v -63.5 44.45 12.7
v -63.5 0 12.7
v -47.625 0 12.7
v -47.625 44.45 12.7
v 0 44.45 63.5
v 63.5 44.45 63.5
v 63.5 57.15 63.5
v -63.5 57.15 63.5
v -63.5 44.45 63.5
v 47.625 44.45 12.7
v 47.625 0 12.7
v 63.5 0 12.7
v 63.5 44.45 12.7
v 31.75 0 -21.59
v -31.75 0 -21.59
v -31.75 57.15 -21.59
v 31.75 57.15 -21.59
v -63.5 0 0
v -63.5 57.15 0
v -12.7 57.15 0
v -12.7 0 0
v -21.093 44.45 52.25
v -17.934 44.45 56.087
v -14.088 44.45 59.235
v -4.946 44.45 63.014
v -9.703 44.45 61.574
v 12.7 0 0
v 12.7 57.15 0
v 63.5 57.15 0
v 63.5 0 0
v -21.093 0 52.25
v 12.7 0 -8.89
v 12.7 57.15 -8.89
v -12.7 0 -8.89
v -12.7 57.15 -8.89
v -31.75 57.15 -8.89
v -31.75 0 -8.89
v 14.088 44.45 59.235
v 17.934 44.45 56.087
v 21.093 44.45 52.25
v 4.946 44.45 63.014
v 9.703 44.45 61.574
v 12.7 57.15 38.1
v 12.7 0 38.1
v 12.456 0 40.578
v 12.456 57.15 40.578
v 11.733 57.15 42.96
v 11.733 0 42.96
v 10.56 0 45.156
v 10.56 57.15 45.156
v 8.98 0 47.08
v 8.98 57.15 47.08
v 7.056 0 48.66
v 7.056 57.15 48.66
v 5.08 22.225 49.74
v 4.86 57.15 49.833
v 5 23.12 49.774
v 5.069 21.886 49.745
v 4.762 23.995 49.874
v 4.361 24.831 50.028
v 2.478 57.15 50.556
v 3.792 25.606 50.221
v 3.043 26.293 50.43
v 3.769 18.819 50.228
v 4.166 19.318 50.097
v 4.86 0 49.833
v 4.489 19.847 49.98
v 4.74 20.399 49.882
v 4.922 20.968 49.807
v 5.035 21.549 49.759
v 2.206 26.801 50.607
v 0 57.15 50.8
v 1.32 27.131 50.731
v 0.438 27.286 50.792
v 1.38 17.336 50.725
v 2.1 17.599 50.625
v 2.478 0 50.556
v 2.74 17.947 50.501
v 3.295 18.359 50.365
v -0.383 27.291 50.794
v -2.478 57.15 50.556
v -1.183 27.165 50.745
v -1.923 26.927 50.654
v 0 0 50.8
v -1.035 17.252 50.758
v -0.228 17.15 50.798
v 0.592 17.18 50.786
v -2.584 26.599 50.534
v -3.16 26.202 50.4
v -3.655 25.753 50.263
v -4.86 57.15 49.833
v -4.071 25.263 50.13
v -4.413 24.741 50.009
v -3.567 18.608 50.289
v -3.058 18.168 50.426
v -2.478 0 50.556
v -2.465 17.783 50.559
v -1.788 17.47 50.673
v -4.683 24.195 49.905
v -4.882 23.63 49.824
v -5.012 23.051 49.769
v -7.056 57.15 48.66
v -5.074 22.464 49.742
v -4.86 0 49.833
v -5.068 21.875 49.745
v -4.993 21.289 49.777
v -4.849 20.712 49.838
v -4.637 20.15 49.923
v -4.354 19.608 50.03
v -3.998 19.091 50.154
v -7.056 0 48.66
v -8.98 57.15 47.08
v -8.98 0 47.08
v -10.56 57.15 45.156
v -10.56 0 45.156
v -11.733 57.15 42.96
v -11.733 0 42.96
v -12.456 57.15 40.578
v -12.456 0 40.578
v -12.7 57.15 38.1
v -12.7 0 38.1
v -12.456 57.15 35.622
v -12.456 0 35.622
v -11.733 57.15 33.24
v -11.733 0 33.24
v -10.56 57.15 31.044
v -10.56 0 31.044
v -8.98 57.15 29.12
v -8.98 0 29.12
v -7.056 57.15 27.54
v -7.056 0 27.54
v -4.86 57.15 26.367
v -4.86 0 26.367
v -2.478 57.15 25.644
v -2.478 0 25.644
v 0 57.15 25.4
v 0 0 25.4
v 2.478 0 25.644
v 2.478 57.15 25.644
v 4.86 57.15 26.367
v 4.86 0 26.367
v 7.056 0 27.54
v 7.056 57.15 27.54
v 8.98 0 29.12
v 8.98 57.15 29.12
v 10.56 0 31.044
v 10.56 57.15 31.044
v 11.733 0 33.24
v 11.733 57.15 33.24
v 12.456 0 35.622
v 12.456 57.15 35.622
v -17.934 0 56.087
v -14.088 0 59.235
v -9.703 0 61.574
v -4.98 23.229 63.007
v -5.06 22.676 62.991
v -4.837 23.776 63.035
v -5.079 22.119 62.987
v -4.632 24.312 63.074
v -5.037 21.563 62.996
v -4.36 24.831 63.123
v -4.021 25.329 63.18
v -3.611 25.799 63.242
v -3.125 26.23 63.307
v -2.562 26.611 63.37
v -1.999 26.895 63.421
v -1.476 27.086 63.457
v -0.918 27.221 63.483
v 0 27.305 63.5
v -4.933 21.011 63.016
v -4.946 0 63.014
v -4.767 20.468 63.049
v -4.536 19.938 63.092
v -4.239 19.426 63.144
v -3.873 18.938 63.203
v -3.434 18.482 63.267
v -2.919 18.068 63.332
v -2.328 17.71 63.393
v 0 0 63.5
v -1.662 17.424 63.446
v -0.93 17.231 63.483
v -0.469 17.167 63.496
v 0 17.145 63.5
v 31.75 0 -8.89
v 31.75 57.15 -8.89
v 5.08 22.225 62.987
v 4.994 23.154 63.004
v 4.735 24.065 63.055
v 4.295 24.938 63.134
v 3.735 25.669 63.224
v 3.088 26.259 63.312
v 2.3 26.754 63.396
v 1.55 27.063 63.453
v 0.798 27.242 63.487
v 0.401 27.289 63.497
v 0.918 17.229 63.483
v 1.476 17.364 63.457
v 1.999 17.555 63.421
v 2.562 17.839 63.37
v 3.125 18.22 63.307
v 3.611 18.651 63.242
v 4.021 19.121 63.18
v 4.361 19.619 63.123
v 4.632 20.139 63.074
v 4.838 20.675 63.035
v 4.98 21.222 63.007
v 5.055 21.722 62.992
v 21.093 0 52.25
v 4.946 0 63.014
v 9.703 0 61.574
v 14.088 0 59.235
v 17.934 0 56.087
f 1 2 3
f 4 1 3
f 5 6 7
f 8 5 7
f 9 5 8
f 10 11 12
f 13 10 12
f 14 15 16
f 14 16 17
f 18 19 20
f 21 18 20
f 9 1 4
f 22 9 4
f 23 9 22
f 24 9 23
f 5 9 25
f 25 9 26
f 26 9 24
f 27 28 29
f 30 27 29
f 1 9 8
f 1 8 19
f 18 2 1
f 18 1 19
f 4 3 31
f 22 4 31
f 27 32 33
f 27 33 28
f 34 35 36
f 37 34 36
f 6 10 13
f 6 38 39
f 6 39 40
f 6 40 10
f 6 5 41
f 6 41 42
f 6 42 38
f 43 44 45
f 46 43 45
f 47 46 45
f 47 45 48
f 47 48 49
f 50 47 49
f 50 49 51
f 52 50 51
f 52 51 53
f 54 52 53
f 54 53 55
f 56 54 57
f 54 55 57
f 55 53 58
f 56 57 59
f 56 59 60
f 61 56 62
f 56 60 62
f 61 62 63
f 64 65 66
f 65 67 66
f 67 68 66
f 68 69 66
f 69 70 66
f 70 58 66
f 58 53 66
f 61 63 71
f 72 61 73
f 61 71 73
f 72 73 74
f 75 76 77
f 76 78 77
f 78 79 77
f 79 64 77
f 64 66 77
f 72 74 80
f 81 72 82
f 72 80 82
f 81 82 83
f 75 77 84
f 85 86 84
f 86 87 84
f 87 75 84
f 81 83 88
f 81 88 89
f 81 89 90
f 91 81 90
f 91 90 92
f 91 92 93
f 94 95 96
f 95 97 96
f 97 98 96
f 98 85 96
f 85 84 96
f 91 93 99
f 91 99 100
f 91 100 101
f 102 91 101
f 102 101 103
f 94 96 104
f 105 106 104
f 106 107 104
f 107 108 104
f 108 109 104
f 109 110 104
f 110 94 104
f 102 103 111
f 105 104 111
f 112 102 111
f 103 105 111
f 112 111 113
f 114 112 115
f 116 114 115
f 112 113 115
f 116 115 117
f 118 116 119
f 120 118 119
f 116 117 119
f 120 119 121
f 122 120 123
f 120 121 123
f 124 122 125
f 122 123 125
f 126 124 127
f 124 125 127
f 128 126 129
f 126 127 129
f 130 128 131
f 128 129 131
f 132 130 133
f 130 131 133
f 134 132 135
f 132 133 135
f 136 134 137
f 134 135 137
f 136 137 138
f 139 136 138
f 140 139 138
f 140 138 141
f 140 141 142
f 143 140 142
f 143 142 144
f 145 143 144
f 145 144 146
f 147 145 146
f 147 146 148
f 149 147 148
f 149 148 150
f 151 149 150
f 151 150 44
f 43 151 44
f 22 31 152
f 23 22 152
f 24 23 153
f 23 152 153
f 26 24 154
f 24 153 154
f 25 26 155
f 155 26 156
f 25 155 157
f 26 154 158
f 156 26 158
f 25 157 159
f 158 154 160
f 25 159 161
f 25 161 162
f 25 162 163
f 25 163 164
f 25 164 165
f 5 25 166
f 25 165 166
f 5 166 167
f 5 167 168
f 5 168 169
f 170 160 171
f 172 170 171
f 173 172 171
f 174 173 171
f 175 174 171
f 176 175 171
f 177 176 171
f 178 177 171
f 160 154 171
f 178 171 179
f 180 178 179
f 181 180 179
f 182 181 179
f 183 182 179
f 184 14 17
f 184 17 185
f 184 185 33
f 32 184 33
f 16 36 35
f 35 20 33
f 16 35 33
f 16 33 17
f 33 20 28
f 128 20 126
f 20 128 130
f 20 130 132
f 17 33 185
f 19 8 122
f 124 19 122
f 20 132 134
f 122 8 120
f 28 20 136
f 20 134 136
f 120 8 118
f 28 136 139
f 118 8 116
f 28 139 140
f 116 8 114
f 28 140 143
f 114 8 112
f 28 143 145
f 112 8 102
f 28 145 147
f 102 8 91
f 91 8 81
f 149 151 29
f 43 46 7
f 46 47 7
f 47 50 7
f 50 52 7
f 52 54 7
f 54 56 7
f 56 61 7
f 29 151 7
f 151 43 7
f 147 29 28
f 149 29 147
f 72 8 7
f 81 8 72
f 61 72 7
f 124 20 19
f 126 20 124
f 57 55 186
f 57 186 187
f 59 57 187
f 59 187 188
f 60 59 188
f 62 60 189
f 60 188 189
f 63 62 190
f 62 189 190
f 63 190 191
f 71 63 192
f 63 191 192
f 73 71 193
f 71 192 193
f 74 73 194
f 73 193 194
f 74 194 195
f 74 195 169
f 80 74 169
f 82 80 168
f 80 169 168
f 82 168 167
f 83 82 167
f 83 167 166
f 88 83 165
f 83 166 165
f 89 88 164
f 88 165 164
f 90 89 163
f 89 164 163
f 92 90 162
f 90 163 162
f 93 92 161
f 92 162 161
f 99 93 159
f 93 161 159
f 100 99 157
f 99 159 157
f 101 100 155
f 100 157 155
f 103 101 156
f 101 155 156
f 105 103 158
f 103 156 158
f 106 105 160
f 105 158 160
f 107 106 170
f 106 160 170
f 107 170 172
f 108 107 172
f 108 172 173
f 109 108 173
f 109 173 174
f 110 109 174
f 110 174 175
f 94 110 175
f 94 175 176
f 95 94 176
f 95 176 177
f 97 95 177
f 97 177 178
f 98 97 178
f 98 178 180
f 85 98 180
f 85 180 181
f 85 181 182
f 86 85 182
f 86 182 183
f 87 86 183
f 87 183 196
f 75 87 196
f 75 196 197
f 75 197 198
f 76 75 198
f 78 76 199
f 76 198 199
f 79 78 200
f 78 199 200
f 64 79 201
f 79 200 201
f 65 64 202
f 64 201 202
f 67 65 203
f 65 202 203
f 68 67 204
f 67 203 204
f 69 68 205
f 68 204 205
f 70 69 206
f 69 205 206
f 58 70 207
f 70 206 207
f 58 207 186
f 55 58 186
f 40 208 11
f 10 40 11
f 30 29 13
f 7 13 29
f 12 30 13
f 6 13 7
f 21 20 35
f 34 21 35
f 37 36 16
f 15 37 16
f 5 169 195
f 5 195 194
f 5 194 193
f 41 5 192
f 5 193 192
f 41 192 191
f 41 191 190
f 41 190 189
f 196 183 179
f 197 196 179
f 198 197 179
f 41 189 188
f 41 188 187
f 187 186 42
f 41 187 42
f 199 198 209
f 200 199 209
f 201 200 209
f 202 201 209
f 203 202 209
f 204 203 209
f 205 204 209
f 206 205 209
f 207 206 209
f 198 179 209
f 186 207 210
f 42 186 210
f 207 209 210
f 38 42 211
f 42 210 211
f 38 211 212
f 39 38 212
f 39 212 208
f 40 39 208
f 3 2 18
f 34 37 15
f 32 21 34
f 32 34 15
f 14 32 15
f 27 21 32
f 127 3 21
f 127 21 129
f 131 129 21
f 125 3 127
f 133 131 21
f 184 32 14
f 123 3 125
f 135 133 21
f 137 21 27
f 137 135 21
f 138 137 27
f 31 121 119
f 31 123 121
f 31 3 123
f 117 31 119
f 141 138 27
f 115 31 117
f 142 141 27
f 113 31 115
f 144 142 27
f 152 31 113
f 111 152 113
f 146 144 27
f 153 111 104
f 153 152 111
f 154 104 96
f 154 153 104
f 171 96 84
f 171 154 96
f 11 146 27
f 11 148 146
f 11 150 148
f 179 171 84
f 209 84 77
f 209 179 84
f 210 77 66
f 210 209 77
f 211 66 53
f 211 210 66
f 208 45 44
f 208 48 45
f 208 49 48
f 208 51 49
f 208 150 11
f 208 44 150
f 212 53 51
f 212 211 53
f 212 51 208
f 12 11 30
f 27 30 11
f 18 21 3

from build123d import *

# Parameters (mm, degrees)
F0_R     = 12.7
F1_DEPTH = 57.15
F2_DEPTH = 44.45
F3_R     = 5.08
F4_DEPTH = 13.7612578348


with BuildPart() as f1:
    # F0 (on Front) → F1 (new body)
    with BuildSketch(Plane.XZ):
        with BuildLine():
            Line((-31.75, -8.89), (-31.75, -21.59))
            Line((-31.75, -21.59), (31.75, -21.59))
            Line((31.75, -21.59), (31.75, -8.89))
            Line((31.75, -8.89), (12.7, -8.89))
            Line((12.7, -8.89), (12.7, 0))
            Line((12.7, 0), (63.5, 0))
            Line((63.5, 0), (63.5, 12.7))
            Line((63.5, 12.7), (47.625, 12.7))
            Line((47.625, 12.7), (21.0934256055, 52.2501730104))
            ThreePointArc((21.0934256055, 52.2501730104), (11.9529411765, 60.5117647059), (0, 63.5))
            ThreePointArc((0, 63.5), (-11.9529411765, 60.5117647059), (-21.0934256055, 52.2501730104))
            Line((-21.0934256055, 52.2501730104), (-47.625, 12.7))
            Line((-47.625, 12.7), (-63.5, 12.7))
            Line((-63.5, 12.7), (-63.5, 0))
            Line((-63.5, 0), (-12.7, 0))
            Line((-12.7, 0), (-12.7, -8.89))
            Line((-12.7, -8.89), (-31.75, -8.89))
        make_face()
        with Locations((0, 38.1)):
            Circle(F0_R, mode=Mode.SUBTRACT)
        with BuildLine():
            Line((-63.5, 63.5), (-63.5, 12.7))
            Line((-63.5, 12.7), (-47.625, 12.7))
            Line((-47.625, 12.7), (-21.0934256055, 52.2501730104))
            ThreePointArc((-21.0934256055, 52.2501730104), (-11.9529411765, 60.5117647059), (0, 63.5))
            Line((0, 63.5), (-63.5, 63.5))
        make_face()
        with BuildLine():
            Line((47.625, 12.7), (63.5, 12.7))
            Line((63.5, 12.7), (63.5, 63.5))
            Line((63.5, 63.5), (0, 63.5))
            ThreePointArc((0, 63.5), (11.9529411765, 60.5117647059), (21.0934256055, 52.2501730104))
            Line((21.0934256055, 52.2501730104), (47.625, 12.7))
        make_face()
    extrude(amount=-F1_DEPTH)

    # F0 (on Front) → F2 (cut)
    with BuildSketch(Plane.XZ):
        with BuildLine():
            Line((-63.5, 63.5), (-63.5, 12.7))
            Line((-63.5, 12.7), (-47.625, 12.7))
            Line((-47.625, 12.7), (-21.0934256055, 52.2501730104))
            ThreePointArc((-21.0934256055, 52.2501730104), (-11.9529411765, 60.5117647059), (0, 63.5))
            Line((0, 63.5), (-63.5, 63.5))
        make_face()
        with BuildLine():
            Line((47.625, 12.7), (63.5, 12.7))
            Line((63.5, 12.7), (63.5, 63.5))
            Line((63.5, 63.5), (0, 63.5))
            ThreePointArc((0, 63.5), (11.9529411765, 60.5117647059), (21.0934256055, 52.2501730104))
            Line((21.0934256055, 52.2501730104), (47.625, 12.7))
        make_face()
    extrude(amount=-F2_DEPTH, mode=Mode.SUBTRACT)

    # F3 (on face) → F4 (cut, through all)
    with BuildSketch(Plane.XY.offset(63.5)):
        with Locations((0, 22.225)):
            Circle(F3_R)
    extrude(amount=-F4_DEPTH, mode=Mode.SUBTRACT)


solid = f1.part
